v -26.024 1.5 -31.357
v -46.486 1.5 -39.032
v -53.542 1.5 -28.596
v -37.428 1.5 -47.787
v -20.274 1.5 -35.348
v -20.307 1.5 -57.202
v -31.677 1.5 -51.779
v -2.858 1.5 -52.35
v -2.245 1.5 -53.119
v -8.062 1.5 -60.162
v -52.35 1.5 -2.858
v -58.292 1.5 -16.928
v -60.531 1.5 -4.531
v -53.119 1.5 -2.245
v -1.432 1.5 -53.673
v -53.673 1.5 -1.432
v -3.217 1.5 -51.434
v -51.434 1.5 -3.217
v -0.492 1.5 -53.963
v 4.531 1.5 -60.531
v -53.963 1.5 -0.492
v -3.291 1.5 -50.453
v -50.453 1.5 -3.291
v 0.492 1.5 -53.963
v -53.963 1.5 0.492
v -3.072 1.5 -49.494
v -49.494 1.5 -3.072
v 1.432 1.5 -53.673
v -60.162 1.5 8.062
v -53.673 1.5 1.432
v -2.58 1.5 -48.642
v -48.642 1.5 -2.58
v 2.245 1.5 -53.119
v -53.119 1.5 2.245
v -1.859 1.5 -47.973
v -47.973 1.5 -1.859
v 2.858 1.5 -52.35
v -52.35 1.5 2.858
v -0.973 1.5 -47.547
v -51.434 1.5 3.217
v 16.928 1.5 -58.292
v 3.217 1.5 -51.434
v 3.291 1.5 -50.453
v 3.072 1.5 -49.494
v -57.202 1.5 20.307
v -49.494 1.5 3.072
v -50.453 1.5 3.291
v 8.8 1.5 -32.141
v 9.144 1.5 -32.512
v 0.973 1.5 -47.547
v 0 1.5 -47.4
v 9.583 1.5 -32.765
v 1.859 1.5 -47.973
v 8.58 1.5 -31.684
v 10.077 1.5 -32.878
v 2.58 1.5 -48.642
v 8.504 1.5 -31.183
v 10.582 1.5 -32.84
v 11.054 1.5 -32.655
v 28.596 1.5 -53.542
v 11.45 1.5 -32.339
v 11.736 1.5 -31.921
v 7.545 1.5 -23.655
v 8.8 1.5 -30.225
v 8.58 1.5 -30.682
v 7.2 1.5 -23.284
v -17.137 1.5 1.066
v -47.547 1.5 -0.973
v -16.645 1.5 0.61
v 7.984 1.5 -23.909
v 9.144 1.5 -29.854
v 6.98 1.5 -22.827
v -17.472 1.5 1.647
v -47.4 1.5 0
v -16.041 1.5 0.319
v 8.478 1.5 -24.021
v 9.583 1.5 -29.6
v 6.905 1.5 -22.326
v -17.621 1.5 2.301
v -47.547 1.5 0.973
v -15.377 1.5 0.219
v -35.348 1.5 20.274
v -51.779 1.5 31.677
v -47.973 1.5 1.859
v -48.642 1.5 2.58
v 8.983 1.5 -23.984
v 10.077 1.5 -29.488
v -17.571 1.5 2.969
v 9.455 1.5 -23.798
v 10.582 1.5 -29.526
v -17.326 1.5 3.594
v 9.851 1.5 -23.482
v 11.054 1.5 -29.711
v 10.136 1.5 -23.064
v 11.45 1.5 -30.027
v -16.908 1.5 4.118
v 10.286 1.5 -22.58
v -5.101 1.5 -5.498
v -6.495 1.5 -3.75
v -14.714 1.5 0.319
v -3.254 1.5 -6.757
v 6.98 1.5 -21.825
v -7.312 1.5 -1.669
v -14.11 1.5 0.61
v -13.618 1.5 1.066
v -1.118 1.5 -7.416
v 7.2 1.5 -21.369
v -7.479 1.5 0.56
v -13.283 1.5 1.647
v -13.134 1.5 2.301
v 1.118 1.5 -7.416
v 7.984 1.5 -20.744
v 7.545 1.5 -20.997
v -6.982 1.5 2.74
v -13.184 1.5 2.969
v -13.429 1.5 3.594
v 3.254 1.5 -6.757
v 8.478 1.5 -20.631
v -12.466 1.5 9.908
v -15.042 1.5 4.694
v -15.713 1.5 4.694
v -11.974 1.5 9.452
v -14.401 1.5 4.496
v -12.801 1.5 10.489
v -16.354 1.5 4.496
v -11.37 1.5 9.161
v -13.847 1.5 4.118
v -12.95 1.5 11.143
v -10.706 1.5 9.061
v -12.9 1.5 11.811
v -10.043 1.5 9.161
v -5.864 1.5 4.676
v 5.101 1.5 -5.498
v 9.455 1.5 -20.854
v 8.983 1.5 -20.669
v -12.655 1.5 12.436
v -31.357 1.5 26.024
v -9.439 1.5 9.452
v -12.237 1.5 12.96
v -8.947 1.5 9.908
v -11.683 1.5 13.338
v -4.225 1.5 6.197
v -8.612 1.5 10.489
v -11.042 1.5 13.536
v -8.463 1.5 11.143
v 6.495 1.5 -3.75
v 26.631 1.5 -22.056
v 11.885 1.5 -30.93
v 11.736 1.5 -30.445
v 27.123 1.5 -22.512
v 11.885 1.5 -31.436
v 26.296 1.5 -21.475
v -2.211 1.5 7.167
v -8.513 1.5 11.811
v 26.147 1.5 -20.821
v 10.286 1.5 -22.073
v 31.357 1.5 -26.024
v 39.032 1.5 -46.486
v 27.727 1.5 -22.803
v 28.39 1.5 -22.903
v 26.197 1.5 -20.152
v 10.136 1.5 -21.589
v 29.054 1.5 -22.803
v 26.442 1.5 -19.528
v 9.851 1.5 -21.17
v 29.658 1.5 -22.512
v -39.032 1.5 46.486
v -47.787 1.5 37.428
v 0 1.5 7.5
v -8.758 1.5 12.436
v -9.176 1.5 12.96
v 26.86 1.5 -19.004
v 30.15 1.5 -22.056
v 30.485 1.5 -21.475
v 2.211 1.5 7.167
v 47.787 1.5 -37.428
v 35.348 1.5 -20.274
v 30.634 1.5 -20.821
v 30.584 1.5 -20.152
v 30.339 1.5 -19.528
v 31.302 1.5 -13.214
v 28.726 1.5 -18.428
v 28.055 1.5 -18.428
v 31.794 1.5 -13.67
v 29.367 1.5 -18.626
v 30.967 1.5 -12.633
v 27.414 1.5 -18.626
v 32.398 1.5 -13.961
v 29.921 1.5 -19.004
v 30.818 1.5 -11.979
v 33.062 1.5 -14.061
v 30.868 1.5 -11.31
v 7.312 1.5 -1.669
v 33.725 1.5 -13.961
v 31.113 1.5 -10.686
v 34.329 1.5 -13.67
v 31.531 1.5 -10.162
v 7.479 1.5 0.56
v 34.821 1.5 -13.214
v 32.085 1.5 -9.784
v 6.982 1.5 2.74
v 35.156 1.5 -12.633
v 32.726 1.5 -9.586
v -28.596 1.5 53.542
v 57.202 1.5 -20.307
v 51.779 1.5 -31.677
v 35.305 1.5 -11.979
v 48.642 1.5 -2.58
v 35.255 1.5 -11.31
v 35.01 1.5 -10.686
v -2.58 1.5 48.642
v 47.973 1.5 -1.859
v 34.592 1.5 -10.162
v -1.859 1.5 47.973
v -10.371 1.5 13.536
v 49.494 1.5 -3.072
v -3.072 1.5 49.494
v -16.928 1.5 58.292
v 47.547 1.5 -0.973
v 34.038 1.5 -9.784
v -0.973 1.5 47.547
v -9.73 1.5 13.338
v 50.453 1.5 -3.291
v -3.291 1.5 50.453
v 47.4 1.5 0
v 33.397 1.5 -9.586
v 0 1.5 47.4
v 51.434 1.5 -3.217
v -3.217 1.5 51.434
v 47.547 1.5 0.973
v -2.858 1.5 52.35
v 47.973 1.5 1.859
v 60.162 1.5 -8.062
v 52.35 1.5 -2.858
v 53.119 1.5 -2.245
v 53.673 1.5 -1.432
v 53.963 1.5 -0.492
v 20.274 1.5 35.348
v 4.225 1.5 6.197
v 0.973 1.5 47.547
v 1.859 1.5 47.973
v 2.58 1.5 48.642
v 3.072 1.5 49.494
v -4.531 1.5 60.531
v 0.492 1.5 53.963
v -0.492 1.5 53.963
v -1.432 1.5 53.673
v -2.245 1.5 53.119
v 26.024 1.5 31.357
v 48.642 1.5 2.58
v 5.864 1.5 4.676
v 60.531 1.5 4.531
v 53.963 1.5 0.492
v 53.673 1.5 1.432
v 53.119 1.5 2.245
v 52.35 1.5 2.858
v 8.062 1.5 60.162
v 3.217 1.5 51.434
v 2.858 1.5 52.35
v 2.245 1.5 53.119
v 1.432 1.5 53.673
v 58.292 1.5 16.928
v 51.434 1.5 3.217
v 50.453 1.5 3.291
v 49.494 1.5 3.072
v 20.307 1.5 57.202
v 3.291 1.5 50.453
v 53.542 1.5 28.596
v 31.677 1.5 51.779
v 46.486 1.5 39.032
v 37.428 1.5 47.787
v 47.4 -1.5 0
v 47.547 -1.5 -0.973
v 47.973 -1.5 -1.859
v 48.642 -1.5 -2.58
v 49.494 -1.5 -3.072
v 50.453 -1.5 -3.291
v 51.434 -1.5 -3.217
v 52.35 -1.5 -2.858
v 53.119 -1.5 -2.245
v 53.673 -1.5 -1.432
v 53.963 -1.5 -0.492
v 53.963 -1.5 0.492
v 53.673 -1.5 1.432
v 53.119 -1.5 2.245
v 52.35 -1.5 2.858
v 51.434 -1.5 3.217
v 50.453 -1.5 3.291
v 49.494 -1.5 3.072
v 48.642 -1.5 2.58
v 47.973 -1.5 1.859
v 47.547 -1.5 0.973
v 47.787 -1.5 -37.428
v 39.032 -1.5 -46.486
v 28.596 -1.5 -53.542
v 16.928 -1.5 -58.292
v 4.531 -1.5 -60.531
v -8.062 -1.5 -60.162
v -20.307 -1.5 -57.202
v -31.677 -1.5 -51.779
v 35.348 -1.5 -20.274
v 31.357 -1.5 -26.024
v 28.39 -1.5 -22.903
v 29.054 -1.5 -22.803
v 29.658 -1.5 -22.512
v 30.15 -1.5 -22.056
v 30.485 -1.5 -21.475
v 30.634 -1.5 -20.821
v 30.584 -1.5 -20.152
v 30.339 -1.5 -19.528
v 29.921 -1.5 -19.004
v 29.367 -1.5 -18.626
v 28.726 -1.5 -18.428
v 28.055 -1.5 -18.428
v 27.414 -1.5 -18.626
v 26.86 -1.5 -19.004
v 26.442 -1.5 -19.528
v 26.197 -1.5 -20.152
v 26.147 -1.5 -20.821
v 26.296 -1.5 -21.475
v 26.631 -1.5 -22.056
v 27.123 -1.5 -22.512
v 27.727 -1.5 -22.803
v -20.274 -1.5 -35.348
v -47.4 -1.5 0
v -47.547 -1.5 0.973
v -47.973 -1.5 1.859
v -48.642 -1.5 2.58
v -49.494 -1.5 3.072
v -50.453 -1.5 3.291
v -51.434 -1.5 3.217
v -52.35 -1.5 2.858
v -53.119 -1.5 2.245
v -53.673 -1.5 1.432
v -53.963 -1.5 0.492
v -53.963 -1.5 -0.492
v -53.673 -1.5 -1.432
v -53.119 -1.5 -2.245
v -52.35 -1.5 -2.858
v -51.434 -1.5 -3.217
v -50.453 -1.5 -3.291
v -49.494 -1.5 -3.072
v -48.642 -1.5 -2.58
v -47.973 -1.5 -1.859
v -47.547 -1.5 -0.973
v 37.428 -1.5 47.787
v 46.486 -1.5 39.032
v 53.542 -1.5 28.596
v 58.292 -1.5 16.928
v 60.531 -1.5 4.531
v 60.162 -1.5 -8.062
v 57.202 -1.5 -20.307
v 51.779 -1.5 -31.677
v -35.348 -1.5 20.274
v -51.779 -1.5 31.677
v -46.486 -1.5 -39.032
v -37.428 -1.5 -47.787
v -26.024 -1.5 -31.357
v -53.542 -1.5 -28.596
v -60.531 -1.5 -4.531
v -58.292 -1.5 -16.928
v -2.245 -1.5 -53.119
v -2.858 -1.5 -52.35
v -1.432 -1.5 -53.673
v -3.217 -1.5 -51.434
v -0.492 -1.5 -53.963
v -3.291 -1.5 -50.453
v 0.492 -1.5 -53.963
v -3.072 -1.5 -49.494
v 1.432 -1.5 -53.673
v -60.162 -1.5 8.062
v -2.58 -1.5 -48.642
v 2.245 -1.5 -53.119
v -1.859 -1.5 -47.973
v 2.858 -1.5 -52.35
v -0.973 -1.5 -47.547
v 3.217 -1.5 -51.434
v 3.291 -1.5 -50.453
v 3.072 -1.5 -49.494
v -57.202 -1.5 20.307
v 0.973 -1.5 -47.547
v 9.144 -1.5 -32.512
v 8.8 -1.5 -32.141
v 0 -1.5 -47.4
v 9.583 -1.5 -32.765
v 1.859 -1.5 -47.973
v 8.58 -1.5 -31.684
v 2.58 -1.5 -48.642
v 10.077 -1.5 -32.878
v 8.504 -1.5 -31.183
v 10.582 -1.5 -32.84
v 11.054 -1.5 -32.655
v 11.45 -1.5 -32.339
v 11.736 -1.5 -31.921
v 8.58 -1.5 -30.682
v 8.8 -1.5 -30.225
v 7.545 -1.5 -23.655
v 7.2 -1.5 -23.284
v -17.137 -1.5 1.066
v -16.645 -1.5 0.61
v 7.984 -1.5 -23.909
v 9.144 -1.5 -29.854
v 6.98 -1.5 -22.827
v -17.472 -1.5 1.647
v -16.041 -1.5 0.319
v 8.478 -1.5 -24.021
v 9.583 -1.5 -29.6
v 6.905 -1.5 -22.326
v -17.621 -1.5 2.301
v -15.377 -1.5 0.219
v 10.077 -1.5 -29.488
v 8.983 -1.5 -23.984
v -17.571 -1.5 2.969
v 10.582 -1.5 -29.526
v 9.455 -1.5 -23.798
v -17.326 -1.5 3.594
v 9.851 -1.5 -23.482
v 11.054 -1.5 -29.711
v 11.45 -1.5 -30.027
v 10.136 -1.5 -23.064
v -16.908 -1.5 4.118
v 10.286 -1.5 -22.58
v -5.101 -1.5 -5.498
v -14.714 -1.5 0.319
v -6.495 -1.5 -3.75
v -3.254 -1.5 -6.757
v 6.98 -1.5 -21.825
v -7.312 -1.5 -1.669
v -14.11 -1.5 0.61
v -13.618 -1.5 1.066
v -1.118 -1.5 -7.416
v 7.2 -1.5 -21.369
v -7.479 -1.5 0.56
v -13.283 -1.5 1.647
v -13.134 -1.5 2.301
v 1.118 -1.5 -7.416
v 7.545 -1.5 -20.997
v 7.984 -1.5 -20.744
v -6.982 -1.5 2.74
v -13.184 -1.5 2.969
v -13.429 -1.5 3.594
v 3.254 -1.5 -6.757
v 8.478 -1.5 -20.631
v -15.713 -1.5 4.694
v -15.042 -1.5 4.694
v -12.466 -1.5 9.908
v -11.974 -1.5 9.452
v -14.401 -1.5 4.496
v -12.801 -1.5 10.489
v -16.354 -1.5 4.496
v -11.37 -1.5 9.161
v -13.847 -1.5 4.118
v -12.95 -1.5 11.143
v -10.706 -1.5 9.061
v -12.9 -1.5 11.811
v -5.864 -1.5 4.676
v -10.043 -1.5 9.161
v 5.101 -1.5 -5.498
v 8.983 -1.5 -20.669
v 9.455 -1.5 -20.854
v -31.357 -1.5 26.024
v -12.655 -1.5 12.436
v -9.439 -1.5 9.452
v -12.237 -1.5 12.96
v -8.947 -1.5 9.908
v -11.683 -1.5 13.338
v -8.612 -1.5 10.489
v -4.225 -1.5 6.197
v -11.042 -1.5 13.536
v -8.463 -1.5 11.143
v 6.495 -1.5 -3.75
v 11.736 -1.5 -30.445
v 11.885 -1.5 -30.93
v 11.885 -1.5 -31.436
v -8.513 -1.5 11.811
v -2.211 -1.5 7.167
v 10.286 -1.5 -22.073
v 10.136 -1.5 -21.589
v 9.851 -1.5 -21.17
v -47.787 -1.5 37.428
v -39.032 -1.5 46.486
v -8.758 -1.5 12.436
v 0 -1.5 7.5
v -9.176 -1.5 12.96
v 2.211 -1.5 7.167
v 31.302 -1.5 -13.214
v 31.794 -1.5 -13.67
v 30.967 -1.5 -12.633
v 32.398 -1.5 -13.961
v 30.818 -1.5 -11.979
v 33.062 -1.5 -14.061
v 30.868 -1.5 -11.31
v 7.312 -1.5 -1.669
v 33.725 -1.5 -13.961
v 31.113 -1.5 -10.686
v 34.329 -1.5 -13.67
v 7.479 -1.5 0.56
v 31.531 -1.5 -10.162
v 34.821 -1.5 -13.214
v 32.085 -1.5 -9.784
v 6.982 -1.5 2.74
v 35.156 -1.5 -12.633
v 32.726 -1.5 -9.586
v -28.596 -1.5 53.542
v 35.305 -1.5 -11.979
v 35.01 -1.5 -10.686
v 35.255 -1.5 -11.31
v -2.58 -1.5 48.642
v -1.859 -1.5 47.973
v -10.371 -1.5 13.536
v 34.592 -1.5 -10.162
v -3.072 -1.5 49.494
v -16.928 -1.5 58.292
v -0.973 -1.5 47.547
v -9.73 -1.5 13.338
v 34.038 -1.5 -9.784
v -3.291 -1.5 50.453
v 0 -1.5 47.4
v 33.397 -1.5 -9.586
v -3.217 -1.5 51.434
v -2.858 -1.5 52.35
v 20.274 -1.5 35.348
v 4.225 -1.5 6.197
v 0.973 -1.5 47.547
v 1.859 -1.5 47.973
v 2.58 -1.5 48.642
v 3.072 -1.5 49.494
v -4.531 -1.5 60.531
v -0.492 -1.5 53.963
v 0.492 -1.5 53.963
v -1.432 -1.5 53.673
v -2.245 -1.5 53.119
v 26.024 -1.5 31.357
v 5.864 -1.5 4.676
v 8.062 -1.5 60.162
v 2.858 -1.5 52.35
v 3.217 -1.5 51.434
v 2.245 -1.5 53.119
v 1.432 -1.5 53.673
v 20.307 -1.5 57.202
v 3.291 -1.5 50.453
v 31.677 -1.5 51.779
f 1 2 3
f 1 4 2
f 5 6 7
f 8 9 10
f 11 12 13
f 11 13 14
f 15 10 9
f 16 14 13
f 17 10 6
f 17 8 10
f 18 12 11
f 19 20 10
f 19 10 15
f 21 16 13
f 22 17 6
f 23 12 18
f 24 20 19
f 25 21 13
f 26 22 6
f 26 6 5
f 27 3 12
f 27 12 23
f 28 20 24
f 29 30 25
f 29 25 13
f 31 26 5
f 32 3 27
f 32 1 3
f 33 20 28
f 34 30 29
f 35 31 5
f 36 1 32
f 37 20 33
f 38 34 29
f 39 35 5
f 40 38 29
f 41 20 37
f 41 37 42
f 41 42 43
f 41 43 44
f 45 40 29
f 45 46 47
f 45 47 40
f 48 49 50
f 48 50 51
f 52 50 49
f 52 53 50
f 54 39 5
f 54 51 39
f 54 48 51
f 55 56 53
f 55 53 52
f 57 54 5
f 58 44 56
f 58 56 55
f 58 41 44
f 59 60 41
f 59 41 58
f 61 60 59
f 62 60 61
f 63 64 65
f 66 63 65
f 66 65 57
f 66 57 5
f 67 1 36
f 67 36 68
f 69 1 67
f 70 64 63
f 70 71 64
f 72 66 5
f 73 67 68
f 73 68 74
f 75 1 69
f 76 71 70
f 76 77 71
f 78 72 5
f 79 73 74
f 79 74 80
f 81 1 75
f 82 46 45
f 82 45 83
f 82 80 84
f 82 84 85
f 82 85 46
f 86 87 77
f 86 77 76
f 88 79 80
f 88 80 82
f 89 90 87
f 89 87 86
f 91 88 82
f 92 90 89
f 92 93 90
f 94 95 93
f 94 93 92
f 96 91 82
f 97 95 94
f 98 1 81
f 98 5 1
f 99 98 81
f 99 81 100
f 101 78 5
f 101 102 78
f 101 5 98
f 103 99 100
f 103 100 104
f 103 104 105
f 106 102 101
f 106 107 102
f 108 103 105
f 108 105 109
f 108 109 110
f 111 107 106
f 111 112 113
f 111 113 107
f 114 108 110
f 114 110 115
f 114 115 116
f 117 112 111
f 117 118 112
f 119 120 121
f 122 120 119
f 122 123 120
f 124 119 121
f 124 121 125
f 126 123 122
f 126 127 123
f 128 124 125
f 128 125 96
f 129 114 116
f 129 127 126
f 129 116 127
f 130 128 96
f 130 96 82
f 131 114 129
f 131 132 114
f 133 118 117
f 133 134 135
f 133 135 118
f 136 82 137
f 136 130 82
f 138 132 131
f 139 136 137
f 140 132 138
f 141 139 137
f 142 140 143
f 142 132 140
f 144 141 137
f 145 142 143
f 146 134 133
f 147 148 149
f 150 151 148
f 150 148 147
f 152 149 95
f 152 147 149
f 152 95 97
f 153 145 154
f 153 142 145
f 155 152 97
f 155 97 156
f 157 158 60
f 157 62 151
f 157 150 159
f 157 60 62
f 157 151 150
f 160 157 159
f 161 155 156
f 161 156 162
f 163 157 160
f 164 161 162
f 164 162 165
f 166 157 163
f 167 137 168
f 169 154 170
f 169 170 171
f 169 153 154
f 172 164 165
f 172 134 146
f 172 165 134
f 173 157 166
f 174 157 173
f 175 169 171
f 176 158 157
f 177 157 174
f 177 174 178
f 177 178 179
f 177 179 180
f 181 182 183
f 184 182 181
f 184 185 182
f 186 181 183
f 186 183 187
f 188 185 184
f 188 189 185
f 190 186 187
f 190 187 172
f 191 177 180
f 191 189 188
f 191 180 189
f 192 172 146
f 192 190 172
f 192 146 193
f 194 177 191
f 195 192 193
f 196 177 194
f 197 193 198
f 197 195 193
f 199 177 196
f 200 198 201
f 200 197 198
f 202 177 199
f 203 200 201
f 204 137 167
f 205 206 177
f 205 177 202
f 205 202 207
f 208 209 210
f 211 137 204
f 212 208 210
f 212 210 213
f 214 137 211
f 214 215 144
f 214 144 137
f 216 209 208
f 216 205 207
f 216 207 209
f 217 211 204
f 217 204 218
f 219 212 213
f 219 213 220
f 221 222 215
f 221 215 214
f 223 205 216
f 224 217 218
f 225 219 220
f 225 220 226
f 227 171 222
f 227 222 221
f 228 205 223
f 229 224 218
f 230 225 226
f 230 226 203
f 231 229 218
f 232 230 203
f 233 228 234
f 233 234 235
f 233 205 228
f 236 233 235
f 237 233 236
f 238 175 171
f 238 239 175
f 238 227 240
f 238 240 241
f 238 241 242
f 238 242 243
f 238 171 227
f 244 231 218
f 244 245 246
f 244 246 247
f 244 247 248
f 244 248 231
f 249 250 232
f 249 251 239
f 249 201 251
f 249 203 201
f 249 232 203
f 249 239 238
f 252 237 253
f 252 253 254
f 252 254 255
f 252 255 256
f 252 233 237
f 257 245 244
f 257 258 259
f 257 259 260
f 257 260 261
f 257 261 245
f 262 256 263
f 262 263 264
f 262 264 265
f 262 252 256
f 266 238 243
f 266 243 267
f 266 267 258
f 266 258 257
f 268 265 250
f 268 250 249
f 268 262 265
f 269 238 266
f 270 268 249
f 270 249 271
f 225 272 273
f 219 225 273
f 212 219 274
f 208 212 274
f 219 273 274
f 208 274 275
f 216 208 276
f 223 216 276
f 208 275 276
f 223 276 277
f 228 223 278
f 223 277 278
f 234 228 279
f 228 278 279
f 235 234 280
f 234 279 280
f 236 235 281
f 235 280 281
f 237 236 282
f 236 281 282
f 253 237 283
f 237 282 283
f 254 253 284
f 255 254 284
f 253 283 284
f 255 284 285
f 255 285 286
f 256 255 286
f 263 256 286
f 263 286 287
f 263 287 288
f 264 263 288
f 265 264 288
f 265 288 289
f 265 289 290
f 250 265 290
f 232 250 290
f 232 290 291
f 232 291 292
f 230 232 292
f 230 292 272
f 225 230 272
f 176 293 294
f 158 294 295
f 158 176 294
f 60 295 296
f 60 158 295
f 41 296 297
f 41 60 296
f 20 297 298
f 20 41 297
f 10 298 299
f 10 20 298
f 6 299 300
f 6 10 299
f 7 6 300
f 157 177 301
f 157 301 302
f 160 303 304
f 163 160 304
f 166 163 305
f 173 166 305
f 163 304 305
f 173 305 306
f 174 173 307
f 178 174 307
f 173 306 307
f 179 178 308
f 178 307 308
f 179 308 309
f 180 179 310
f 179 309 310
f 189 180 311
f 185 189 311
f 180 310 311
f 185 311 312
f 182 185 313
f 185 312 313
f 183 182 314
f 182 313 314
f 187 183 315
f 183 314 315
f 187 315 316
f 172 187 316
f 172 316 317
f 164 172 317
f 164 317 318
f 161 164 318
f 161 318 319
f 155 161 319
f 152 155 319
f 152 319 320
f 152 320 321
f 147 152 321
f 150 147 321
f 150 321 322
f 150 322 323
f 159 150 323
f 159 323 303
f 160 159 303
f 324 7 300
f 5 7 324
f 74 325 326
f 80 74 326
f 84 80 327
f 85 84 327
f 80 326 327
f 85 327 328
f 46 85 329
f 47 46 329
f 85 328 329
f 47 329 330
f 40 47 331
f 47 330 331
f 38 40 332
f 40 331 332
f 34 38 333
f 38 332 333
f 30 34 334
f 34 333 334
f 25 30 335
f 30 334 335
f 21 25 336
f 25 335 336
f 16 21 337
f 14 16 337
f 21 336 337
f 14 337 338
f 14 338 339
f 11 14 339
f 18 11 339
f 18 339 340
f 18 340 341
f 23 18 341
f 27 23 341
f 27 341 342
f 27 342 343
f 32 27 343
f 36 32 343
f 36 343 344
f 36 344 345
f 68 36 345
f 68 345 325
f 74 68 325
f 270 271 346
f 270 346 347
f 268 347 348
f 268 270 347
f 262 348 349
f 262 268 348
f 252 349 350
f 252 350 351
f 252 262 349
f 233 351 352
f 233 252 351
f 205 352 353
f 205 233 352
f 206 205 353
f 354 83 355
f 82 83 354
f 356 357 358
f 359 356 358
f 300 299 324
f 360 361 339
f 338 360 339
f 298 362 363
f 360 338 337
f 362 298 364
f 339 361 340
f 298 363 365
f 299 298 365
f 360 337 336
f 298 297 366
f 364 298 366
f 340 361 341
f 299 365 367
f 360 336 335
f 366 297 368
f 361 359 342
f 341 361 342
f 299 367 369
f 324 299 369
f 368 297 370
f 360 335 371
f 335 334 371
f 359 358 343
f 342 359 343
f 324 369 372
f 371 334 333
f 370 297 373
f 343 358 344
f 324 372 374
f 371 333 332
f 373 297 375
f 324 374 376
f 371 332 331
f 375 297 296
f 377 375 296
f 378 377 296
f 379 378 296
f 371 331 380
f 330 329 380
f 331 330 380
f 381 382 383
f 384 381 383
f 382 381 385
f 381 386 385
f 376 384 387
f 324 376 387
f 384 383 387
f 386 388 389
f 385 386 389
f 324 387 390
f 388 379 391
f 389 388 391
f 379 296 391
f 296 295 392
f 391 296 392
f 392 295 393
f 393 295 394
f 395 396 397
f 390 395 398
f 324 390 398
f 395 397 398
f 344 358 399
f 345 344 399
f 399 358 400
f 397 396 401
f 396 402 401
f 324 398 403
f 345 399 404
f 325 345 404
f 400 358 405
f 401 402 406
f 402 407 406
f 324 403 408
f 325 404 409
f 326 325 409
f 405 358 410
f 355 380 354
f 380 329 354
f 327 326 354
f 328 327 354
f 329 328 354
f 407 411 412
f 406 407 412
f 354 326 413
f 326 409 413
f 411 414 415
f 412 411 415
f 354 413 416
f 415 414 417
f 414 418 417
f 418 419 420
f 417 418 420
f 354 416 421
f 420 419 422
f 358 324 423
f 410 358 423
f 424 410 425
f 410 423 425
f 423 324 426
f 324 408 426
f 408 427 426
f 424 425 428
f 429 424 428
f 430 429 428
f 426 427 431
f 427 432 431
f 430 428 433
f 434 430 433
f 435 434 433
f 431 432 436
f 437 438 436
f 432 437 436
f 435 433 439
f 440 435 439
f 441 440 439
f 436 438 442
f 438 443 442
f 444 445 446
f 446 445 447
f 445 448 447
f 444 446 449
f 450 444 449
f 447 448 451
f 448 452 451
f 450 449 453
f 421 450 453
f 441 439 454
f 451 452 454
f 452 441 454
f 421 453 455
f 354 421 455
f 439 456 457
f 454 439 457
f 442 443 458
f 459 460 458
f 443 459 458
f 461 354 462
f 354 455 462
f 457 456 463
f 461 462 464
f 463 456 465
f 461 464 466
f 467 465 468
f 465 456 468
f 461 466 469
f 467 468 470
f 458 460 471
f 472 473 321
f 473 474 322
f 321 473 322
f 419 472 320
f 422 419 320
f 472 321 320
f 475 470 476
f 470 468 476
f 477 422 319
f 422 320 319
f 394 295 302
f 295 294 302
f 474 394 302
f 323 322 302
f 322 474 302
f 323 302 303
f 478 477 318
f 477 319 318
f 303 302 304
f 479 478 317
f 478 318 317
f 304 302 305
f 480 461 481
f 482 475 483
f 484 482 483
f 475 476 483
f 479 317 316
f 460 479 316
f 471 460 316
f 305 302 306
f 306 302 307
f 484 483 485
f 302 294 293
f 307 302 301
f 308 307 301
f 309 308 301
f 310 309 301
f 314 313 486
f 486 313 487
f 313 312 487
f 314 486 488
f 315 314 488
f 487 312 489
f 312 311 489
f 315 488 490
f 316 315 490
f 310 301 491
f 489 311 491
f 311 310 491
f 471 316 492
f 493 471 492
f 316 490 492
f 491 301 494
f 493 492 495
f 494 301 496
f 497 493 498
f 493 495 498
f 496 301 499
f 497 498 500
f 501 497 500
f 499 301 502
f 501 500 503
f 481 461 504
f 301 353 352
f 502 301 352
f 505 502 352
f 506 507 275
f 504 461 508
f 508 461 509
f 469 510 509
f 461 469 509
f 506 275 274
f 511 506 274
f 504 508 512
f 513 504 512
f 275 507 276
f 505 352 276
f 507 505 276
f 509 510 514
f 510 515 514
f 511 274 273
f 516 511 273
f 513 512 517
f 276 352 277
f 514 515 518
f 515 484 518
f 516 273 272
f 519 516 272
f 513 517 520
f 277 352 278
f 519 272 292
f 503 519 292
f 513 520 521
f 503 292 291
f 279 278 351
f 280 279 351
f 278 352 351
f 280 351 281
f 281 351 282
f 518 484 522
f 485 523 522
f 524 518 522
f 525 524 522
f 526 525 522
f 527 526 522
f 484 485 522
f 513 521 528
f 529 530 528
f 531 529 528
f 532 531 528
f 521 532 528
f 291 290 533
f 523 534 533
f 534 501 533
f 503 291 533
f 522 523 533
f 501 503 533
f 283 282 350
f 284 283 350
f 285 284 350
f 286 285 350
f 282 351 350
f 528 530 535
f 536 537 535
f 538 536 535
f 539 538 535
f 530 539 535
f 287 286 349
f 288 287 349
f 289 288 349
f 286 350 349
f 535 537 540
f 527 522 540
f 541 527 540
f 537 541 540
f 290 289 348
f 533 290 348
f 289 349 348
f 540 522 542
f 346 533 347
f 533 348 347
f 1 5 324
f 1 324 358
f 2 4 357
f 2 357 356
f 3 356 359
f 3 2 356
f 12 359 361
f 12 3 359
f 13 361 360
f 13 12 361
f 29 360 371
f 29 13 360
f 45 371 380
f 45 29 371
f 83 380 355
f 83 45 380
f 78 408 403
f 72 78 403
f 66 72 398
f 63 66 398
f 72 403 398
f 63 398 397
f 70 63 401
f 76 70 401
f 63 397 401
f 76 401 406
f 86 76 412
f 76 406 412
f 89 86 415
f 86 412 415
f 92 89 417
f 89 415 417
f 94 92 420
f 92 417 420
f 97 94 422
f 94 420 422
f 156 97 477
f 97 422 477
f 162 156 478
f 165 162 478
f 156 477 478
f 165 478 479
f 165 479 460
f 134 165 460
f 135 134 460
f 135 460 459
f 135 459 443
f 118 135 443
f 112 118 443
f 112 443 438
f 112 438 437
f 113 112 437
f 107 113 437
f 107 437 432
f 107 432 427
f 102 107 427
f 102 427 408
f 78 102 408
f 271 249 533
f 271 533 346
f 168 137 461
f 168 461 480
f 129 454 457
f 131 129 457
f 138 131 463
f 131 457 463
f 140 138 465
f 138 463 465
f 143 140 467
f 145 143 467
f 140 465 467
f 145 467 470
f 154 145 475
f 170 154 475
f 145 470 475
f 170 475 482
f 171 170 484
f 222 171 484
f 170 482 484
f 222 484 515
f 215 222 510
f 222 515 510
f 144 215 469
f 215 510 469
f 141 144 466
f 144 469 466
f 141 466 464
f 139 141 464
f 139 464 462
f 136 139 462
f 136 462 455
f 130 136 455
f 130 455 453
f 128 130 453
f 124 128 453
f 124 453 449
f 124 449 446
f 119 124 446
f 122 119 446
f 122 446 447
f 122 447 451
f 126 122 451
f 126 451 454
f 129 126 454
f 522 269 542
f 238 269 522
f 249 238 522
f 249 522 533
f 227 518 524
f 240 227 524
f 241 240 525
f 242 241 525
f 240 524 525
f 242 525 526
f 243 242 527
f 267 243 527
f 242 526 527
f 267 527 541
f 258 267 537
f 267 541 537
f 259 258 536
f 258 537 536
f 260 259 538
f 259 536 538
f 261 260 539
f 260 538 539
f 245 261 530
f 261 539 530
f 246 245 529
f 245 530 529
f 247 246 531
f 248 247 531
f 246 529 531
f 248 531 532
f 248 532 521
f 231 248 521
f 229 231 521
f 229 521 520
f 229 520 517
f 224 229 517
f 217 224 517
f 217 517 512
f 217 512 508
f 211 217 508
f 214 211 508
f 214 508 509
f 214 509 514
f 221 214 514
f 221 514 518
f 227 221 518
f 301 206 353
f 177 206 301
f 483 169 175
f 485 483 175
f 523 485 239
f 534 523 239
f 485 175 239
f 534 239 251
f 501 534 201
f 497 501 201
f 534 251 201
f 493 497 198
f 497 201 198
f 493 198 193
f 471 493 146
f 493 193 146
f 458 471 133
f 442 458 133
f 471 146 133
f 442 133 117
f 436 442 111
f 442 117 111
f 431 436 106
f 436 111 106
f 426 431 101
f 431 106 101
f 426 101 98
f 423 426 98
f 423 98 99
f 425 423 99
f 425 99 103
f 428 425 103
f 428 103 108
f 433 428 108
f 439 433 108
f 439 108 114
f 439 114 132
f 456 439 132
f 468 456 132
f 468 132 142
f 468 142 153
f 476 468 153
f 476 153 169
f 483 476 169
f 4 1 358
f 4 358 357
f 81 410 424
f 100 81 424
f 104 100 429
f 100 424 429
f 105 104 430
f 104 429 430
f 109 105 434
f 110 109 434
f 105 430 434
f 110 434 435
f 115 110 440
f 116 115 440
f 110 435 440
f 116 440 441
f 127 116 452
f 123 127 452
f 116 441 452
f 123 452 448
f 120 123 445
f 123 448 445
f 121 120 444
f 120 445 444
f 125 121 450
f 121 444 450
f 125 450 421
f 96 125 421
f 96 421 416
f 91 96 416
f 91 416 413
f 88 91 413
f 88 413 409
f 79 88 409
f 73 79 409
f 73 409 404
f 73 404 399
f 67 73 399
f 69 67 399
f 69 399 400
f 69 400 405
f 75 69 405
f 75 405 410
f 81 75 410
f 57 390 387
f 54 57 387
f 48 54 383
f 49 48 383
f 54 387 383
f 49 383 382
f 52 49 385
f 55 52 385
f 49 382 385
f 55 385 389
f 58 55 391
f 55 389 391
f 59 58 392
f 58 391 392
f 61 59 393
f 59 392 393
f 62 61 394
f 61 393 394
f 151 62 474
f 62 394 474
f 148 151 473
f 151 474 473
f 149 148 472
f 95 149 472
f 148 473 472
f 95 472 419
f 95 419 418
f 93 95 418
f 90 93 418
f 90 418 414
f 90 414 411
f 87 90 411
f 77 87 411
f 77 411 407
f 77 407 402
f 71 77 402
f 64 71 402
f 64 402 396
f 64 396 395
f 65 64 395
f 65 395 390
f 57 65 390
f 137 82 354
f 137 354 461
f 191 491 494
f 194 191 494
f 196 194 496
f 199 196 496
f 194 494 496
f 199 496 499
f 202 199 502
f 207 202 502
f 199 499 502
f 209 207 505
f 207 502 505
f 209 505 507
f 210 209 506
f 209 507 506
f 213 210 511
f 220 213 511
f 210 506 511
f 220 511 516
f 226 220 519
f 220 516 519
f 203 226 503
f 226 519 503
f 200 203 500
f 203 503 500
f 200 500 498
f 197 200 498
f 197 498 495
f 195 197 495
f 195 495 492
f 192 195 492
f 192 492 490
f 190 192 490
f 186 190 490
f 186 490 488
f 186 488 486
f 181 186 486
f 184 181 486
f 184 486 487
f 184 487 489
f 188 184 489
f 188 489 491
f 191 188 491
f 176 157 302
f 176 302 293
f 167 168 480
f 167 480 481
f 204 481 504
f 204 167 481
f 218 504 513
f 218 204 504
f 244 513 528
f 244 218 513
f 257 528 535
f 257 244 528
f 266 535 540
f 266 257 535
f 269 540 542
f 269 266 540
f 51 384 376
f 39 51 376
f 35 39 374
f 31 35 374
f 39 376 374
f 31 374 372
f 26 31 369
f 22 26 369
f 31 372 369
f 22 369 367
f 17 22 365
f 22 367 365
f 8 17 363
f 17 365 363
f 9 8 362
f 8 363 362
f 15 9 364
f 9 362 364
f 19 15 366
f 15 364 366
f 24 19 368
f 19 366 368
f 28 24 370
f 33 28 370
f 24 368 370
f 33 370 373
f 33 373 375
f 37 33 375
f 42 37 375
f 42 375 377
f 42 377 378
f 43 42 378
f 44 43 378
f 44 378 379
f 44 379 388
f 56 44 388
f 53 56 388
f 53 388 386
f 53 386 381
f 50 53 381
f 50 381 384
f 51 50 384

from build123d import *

# Parameters (mm, degrees)
SKETCH1_R                   = 60.7
BOSS_EXTRUDE1_DEPTH         = 1.5
M6_CLEARANCE_HOLE1_D        = 6.6
CIRPATTERN2_COUNT           = 4
SKETCH10_R                  = 7.5
SERVO_HUB_HOLE_DEPTH        = 86.895168665
SKETCH11_R                  = 2.25
SERVO_SCREW_HOLES_DEPTH     = 86.895168665
LEG_MECHANISM_CUTOUTS_DEPTH = 86.895168665
CIRPATTERN3_COUNT           = 4
M3_CLEARANCE_HOLE1_D        = 3.4


with BuildPart() as part:
    # Sketch1 → Boss-Extrude1 (new, symmetric)
    with BuildSketch(Plane(origin=(0, 0, 0), x_dir=(1, 0, 0), z_dir=(0, 1, 0))):
        with Locations(Location((0, 0, 0), (0, 0, 270))):
            Circle(SKETCH1_R)
    extrude(amount=BOSS_EXTRUDE1_DEPTH, both=True)

    # M6 Clearance Hole1 (through all)
    with Locations(Plane(origin=(0, 1.5, 0), x_dir=(1, 0, 0), z_dir=(0, 1, 0))):
        with Locations((50.7, 0)):
            m6_clearance_hole1 = Hole(M6_CLEARANCE_HOLE1_D / 2)

    # CirPattern2: M6 Clearance Hole1 ×4 about axis
    cirpattern2_axis = Axis((0, 0, 0), (0, 1, 0))
    for i in range(1, CIRPATTERN2_COUNT):
        add(m6_clearance_hole1.rotate(cirpattern2_axis, i * 360 / CIRPATTERN2_COUNT), mode=Mode.SUBTRACT)

    # Sketch10 → servo hub hole (cut, through all)
    with BuildSketch(Plane(origin=(0, 1.5, 0), x_dir=(1, 0, 0), z_dir=(0, 1, 0))):
        with Locations(Location((0, 0, 0), (0, 0, 270))):
            Circle(SKETCH10_R)
    extrude(amount=-SERVO_HUB_HOLE_DEPTH, mode=Mode.SUBTRACT)

    # Sketch11 → servo screw holes (cut, through all)
    with BuildSketch(Plane.XZ.offset(1.5)):
        with Locations(Location((-15.377499853, 2.468805027, 0), (0, 0, 270))):
            Circle(SKETCH11_R)
        with Locations(Location((-10.706440914, 11.310818846, 0), (0, 0, 270))):
            Circle(SKETCH11_R)
        with Locations(Location((28.390468552, -20.652936726, 0), (0, 0, 270))):
            Circle(SKETCH11_R)
        with Locations(Location((33.061527492, -11.810922906, 0), (0, 0, 270))):
            Circle(SKETCH11_R)
    extrude(amount=-SERVO_SCREW_HOLES_DEPTH, mode=Mode.SUBTRACT)

    # Sketch13 → leg mechanism cutouts (cut, through all)
    with BuildSketch(Plane(origin=(0, 1.5, 0), x_dir=(1, 0, 0), z_dir=(0, 1, 0))):
        with BuildLine():
            Line((31.677366544, -51.77870652), (20.273657909, -35.348386091))
            Line((20.273657909, -35.348386091), (26.024270059, -31.357088069))
            Line((26.024270059, -31.357088069), (37.427978694, -47.787408498))
            ThreePointArc((37.427978694, -47.787408498), (34.610255706, -49.8660225), (31.677366544, -51.77870652))
        make_face()
    leg_mechanism_cutouts = extrude(amount=-LEG_MECHANISM_CUTOUTS_DEPTH, mode=Mode.SUBTRACT)

    # CirPattern3: leg mechanism cutouts ×4 about axis
    cirpattern3_axis = Axis((0, 0, 0), (0, 1, 0))
    for i in range(1, CIRPATTERN3_COUNT):
        add(leg_mechanism_cutouts.rotate(cirpattern3_axis, i * 360 / CIRPATTERN3_COUNT), mode=Mode.SUBTRACT)

    # M3 Clearance Hole1 (through all)
    with Locations(Plane(origin=(0, 1.5, 0), x_dir=(1, 0, 0), z_dir=(0, 1, 0))):
        with Locations((8.604729668, 22.326187031), (10.204187746, 31.182920845)):
            Hole(M3_CLEARANCE_HOLE1_D / 2)


solid = part.part
